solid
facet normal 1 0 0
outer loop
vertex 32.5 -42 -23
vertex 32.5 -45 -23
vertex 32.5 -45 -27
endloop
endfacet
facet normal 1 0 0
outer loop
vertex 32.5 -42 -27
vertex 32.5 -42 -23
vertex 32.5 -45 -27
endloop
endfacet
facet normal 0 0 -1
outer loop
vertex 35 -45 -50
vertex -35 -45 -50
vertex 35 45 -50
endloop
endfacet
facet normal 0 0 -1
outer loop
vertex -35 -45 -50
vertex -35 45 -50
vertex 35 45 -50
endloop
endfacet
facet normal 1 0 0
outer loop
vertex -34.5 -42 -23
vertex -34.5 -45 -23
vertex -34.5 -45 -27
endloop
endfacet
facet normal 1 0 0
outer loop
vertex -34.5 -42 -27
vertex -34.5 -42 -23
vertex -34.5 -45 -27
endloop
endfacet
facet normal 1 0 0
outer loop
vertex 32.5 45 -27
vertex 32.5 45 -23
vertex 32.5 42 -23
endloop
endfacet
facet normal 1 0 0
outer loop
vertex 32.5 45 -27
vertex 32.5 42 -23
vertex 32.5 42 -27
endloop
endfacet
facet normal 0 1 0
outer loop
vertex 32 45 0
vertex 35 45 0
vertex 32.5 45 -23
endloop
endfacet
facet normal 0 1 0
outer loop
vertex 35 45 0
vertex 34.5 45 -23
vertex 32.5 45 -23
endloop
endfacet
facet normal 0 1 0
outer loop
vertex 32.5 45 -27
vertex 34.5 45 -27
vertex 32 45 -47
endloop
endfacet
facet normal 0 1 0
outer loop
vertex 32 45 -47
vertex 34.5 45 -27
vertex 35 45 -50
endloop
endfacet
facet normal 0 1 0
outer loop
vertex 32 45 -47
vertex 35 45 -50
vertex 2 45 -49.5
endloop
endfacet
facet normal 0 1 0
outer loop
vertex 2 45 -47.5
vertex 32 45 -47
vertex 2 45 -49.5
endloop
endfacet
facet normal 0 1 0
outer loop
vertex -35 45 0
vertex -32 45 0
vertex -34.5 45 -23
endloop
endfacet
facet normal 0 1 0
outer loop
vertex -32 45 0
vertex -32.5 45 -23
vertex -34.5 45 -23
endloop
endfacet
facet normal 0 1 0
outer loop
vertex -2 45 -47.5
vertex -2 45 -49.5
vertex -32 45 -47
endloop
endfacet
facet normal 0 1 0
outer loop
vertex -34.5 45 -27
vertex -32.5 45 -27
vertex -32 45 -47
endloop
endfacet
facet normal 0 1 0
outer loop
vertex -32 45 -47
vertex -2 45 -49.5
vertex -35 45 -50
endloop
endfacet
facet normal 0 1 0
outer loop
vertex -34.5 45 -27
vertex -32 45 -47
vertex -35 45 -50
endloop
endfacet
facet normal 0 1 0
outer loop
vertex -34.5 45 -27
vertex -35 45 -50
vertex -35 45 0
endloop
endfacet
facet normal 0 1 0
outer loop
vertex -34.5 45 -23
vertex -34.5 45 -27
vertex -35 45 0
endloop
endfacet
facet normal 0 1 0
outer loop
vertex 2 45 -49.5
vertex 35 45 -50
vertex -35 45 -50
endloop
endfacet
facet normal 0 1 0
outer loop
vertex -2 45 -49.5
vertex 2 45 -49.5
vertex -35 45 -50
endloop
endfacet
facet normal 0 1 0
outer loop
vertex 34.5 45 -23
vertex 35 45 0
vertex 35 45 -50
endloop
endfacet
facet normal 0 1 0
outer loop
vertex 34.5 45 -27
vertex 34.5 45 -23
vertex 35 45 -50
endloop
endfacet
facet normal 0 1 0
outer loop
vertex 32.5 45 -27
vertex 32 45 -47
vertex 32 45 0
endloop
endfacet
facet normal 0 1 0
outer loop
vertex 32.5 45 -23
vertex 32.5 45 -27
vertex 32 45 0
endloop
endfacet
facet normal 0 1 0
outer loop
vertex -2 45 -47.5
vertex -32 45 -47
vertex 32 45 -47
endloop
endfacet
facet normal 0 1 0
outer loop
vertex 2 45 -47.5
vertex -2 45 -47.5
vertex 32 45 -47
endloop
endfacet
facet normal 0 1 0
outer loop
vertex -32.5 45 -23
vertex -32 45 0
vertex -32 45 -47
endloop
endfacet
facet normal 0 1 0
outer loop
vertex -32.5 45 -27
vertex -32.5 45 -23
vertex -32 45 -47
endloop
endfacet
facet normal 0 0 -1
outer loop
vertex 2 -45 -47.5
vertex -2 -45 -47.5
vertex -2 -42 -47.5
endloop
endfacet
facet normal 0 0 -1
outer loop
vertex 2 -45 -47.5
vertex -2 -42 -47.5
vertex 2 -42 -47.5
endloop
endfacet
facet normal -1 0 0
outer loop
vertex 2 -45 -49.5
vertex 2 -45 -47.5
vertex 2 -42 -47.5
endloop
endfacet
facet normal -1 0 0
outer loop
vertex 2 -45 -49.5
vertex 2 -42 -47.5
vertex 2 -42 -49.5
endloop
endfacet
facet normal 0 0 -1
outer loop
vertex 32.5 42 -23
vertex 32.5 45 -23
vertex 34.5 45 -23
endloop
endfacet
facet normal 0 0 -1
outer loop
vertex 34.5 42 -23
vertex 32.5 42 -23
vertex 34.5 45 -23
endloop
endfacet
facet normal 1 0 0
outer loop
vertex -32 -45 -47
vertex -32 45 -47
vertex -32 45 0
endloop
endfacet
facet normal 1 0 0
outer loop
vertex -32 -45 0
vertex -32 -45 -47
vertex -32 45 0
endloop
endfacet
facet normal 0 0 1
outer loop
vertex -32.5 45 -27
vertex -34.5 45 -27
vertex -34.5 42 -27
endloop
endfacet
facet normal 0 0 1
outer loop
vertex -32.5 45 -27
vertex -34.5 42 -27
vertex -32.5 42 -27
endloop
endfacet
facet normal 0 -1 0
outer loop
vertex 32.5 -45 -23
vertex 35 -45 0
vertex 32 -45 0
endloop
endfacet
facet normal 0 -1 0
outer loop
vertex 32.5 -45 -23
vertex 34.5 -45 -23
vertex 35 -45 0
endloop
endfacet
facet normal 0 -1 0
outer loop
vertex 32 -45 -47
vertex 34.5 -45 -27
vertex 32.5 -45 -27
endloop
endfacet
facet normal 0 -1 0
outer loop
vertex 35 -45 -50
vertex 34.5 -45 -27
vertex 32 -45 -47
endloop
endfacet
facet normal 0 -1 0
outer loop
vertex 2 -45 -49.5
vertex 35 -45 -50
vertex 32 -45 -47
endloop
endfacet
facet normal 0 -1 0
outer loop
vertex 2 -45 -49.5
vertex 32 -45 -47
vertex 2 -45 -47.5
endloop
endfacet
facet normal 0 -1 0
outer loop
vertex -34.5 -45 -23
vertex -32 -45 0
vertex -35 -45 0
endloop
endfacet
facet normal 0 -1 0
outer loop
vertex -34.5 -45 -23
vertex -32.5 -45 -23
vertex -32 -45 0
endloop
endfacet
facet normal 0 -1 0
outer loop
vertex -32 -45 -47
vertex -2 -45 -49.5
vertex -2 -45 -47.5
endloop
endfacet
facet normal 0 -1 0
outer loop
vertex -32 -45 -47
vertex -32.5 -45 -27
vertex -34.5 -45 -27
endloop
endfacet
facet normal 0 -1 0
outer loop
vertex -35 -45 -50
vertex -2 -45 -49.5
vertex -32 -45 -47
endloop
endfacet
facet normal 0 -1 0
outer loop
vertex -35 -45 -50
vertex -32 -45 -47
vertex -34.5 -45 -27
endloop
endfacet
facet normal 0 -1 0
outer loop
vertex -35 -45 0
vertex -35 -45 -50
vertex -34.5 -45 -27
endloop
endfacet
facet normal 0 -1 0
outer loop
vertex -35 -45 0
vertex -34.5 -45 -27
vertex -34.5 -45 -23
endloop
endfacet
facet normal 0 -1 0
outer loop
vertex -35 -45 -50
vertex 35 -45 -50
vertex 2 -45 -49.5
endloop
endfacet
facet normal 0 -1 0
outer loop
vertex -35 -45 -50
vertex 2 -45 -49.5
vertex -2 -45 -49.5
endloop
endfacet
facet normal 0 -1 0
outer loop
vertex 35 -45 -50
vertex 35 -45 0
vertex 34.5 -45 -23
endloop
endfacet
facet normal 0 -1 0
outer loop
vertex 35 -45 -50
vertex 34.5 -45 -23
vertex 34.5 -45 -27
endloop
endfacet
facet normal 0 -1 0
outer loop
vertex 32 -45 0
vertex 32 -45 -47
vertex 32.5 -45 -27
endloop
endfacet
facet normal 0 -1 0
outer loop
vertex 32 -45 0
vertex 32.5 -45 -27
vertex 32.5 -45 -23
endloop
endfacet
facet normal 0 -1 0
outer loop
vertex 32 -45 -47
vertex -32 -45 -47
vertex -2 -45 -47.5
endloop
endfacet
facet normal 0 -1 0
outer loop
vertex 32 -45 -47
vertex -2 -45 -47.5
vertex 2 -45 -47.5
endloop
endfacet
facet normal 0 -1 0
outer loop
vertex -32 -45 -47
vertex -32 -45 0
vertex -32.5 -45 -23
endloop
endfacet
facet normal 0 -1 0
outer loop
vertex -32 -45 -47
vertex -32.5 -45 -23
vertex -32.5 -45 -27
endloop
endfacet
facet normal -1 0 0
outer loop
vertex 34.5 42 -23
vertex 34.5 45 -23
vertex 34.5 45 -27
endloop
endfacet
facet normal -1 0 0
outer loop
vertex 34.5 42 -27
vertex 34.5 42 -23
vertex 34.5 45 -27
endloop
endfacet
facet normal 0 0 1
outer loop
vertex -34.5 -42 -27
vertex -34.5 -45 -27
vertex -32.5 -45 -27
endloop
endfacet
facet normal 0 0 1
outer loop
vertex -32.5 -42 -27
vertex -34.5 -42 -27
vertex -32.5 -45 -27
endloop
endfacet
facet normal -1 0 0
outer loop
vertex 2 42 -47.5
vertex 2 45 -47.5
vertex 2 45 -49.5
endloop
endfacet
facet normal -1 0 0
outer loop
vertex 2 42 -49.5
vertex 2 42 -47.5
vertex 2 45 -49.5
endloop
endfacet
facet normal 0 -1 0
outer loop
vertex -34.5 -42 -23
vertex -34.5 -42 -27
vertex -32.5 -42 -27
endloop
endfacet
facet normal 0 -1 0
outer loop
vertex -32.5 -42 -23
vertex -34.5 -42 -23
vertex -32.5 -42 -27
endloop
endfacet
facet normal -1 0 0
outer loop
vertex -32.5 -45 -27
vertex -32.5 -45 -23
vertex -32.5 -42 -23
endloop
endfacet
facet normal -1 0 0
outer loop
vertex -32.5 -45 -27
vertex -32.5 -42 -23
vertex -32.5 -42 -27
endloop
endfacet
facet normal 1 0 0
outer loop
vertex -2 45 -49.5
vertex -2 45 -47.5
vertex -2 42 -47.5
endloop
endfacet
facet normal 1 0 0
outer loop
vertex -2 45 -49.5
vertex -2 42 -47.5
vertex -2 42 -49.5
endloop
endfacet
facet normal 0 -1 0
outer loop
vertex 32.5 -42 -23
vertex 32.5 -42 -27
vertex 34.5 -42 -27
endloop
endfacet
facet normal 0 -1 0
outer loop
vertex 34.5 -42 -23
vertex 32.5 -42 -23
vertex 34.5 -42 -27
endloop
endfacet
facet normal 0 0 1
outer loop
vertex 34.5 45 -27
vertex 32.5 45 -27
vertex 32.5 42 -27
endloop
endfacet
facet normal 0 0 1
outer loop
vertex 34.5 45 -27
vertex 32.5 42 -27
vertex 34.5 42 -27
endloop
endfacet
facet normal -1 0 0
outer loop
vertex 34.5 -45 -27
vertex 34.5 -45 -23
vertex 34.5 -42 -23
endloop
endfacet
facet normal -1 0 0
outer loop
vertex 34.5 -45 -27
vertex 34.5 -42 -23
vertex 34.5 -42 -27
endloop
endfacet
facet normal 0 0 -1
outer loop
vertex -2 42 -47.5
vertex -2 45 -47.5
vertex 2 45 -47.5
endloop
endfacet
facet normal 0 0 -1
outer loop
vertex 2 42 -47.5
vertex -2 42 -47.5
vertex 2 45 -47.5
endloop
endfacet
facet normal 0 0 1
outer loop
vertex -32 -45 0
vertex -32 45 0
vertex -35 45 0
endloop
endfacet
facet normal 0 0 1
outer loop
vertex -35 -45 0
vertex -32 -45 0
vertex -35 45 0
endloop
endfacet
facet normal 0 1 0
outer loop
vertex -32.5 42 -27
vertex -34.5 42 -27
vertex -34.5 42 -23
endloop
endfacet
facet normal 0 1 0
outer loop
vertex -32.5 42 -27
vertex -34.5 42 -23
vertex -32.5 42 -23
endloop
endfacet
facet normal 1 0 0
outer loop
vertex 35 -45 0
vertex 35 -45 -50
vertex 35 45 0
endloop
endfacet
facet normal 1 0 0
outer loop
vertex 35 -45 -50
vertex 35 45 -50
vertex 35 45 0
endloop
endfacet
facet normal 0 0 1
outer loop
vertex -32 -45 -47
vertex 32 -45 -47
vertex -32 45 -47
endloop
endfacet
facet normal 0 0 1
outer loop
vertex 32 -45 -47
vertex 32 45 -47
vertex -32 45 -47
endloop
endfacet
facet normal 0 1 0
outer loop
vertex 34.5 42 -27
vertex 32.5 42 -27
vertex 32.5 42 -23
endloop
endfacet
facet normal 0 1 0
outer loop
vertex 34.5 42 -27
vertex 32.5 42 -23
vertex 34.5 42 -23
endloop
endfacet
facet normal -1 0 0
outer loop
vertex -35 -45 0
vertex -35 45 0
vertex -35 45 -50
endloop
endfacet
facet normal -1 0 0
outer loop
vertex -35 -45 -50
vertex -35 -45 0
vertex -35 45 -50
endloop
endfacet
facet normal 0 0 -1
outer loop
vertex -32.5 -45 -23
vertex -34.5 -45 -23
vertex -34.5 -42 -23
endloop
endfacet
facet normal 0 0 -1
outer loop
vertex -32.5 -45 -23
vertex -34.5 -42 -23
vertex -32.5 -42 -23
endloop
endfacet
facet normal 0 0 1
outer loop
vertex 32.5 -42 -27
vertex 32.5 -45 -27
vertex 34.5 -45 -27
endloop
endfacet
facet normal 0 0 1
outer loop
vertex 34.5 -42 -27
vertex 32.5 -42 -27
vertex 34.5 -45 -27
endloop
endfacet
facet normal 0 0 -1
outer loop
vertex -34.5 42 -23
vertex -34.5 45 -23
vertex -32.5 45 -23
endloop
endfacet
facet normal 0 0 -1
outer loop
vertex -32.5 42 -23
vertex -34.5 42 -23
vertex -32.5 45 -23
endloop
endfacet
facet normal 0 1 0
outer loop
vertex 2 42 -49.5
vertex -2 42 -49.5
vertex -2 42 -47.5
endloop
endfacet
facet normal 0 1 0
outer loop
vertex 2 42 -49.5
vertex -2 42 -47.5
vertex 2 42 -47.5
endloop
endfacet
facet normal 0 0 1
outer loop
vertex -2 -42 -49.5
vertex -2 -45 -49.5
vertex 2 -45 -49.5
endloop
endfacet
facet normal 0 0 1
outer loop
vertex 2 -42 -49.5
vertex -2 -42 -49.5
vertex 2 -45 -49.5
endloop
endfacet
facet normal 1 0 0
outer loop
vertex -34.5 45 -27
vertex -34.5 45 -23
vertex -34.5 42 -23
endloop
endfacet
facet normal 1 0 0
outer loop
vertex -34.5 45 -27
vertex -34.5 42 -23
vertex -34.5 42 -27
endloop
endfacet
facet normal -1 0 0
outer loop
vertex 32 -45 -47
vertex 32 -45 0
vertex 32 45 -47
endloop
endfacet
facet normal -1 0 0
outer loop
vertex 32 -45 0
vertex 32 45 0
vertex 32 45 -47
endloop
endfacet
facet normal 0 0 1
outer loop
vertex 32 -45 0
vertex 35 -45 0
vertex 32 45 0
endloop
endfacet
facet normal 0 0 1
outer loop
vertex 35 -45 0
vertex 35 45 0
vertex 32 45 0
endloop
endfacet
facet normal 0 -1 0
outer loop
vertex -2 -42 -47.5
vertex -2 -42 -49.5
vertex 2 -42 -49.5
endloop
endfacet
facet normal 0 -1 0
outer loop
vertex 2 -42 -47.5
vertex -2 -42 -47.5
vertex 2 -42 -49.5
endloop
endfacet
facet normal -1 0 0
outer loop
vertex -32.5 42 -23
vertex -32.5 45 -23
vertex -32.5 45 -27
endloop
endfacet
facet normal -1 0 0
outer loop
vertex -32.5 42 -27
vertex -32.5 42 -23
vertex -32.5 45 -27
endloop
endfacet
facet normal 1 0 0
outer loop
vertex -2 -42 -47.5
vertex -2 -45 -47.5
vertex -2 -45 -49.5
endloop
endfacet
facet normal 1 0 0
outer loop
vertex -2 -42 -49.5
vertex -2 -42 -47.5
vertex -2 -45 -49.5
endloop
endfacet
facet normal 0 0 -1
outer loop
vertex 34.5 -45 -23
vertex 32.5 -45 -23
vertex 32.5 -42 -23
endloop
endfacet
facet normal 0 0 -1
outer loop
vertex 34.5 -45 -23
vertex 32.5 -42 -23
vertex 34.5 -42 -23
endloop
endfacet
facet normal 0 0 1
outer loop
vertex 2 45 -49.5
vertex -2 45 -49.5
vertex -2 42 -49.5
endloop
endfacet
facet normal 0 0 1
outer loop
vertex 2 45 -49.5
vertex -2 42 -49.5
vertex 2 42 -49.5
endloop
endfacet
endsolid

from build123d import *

# Parameters (mm, degrees)
BOSS_EXTRUDE1_DEPTH = 45
SKETCH2_W           = 2
SKETCH2_H           = 4
SKETCH2_W_2         = 4
SKETCH2_H_2         = 2
CUT_EXTRUDE1_DEPTH  = 3


with BuildPart() as part:
    # Sketch1 → Boss-Extrude1 (new, symmetric)
    with BuildSketch(Plane(origin=(0, 0, 0), x_dir=(1, 0, 0), z_dir=(0, 1, 0))):
        Polygon((-35, 0), (-35, 50), (35, 50), (35, 0), (32, 0), (32, 47), (-32, 47), (-32, 0), align=None)
    extrude(amount=BOSS_EXTRUDE1_DEPTH, both=True)

    # Sketch2 → Cut-Extrude1 (cut)
    with BuildSketch(Plane(origin=(0, 45, 0), x_dir=(1, 0, 0), z_dir=(0, 1, 0))):
        with Locations((33.5, 25)):
            Rectangle(SKETCH2_W, SKETCH2_H)
        with Locations((-33.5, 25)):
            Rectangle(SKETCH2_W, SKETCH2_H)
        with Locations((0, 48.5)):
            Rectangle(SKETCH2_W_2, SKETCH2_H_2)
    cut_extrude1 = extrude(amount=-CUT_EXTRUDE1_DEPTH, mode=Mode.SUBTRACT)

    # Mirror1: Cut-Extrude1 across plane
    add(cut_extrude1.mirror(Plane.ZX), mode=Mode.SUBTRACT)


solid = part.part
